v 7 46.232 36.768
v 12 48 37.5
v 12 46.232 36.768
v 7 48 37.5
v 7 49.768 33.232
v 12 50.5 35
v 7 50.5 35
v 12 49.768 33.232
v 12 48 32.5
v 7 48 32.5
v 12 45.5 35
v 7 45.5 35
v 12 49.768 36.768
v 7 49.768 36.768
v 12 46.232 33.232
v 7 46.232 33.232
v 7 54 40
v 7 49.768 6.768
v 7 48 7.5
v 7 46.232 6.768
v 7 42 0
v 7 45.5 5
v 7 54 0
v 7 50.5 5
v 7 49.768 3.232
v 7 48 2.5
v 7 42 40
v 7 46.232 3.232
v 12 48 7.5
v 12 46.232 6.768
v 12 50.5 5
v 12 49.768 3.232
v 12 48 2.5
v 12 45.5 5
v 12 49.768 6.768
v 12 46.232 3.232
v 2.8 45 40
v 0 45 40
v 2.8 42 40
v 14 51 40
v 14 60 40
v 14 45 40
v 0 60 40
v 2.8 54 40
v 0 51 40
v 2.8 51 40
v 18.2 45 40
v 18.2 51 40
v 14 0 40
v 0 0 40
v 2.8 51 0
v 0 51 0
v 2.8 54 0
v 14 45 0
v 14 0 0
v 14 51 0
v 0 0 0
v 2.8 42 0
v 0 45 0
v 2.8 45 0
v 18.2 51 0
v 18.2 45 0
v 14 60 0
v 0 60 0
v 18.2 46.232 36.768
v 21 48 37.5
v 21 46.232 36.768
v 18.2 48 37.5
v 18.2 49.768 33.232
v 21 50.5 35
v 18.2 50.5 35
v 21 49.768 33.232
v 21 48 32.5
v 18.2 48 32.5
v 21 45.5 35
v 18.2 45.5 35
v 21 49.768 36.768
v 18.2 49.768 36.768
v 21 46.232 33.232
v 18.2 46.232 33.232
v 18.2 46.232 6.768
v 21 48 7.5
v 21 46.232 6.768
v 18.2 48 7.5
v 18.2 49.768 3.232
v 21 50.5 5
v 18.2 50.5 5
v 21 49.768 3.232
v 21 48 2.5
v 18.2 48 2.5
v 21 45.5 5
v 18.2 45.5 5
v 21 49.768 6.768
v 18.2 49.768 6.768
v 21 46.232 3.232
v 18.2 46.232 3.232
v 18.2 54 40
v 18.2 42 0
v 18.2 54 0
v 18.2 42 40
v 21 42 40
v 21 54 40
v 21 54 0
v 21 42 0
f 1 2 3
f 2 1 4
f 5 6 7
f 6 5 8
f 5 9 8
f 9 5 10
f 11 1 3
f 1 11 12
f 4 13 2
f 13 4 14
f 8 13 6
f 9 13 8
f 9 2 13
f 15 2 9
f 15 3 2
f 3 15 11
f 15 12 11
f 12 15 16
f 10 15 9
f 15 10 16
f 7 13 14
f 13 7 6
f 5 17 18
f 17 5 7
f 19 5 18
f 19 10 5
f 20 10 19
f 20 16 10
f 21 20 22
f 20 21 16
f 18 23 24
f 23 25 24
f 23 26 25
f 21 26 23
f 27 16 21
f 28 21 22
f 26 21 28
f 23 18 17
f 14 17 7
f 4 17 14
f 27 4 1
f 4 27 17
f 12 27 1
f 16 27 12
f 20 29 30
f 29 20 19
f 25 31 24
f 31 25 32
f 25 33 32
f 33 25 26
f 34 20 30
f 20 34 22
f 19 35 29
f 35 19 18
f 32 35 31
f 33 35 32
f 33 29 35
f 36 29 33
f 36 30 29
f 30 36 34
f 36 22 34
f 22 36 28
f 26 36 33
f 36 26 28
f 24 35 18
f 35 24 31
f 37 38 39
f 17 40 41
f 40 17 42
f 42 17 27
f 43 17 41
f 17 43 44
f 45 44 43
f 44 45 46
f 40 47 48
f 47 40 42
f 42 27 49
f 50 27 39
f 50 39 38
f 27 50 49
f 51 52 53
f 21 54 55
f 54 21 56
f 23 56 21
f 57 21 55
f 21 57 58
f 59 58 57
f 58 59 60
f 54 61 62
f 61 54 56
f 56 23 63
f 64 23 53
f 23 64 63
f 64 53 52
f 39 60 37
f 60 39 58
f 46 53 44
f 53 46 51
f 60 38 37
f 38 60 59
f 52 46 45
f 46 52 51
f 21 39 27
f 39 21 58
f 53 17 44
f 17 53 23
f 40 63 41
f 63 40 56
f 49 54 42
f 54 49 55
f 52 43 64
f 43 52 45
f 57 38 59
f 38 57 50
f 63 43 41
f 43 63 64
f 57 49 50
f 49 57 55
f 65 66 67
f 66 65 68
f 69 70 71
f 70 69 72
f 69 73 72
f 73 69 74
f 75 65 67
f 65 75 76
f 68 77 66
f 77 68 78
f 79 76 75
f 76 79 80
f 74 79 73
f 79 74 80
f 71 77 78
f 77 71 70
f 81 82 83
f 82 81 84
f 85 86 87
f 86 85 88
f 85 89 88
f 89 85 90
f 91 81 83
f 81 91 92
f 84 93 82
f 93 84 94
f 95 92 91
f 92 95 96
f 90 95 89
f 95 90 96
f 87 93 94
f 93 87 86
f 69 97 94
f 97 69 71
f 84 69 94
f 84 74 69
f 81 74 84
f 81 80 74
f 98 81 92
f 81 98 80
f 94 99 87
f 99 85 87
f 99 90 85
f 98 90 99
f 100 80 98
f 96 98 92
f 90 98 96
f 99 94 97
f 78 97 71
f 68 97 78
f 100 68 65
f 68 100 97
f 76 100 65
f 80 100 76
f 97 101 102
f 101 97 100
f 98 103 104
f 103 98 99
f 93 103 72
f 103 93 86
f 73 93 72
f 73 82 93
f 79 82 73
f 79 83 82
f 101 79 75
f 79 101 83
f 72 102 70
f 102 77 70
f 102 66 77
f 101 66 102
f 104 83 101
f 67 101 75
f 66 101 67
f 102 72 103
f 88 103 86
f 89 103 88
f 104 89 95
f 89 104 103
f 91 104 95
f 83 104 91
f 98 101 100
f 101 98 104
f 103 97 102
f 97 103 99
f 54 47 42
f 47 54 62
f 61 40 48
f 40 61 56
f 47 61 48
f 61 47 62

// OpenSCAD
// file: keycontrol-mate.scad
module magnet(d, thickness = 2) {
   translate([0, thickness*-1, 0])
    rotate([0, 90, 90])
    color([0, 1, 0])
    cylinder(thickness,d=d);
}

module malematePlate(plateThickness, plateWidth, height) {
    
    magHeight1 = height - magnetDiameter;
    magHeight2 = magnetDiameter;
    
    difference() {
        cube([plateWidth, plateThickness, height]);
        color([0,0,1]) translate([-matingPlateWidth  + magnetThickness/2, matingPlateDepth/2, 0]) rotate ([0,0,90]) {
            translate([0, 0, magHeight1]) magnet(magnetDiameter, magnetThickness);
            translate([0, 0, magHeight2]) magnet(magnetDiameter, magnetThickness);
        }
    }
}


module malemateShaft(plateWidth, shaftLength, shaftWidth, height) {
    cube([shaftWidth, shaftLength, height]);
}

module malemate() {
    // Plate = front facing magnet holder
    // shaft = thing holding plate to structure
    shaftWid = matingShaftDepth;
    plateThick = matingPlateDepth;
    plateWid = matingPlateWidth;
    shaftLength = totalShaftLength - matingPlateWidth;

    rotate([0, 0, 270]) union() {
        translate( [-matingPlateDepth/2, totalShaftLength, 0] )rotate ([0, 0, -90]) malematePlate(plateThick, plateWid, moduleHeight);
        translate([-matingShaftDepth/2, 0, 0]) malemateShaft(plateWid, shaftLength, shaftWid, moduleHeight);
    }
}

module femalemateShaft(holeInset, holeWidth) {
    color([1, 1, 0]) translate([holeWidth, matingShaftDepth/2, 0]) cube([holeInset+1, matingShaftDepth, moduleHeight]);
}

module femalematePlate(holeWidth) {
    cube([holeWidth, matingPlateDepth, moduleHeight]);
}

module femaleHoles(plateThickness, plateWidth, height) {
    
    magHeight1 = height - magnetDiameter;
    magHeight2 = magnetDiameter;
    
    color([0,0,1]) translate([-magnetThickness, matingPlateDepth/2, 0]) rotate ([0,0,90]) {
        translate([0, 0,magHeight1]) magnet(magnetDiameter, magnetThickness);
        translate([0, 0,magHeight2]) magnet(magnetDiameter, magnetThickness);
    }
}

module femalemate() {
    height = moduleHeight;
    shaftWid = matingShaftDepth;
    magDiam = magnetDiameter;
    plateThick = matingPlateWidth;
    plateWid = matingPlateWidth;
    
    connectorLen = connectorLength;
    
    shaftLen = plateThick + connectorLen + shaftOffset;
    holeSize = plateThick + connectorLen;
    holeInsetThickness = matingPlateWidth;
    holeWidth = totalShaftLength - holeInsetThickness;
    
    rotate([0, 0, 180]) translate([0, -matingPlateDepth/2, 0]) union() {
        femalemateShaft(holeInsetThickness, holeWidth);
        femalematePlate(holeWidth);
        femaleHoles(plateThick, plateWid, height);
    }
}


connectorLength = 3;
magnetDiameter = 5;
magnetThickness = 5;
keyWidth = 14;
moduleDepth = 60;
moduleHeight = 40;

matingShaftDepth = moduleDepth * .1;
matingPlateDepth = matingShaftDepth * 2;
matingPlateWidth = keyWidth * 0.2;
totalShaftLength = keyWidth * 0.5;
shaftOffset = moduleDepth / 2;  // Distance from front face to centreline of shaft
// main file
connectorLength = 3;
magnetDiameter = 5;
magnetThickness = 5;
keyWidth = 14;
moduleDepth = 60;
moduleHeight = 40;

matingShaftDepth = moduleDepth * .1;
matingPlateDepth = matingShaftDepth * 2;
matingPlateWidth = keyWidth * 0.2;
totalShaftLength = keyWidth * 0.5;
shaftOffset = moduleDepth / 2;  // Distance from front face to centreline of shaft


include <keycontrol-mate.scad>;

module structure() {
    union() {
        difference() {
            cube([keyWidth, moduleDepth, moduleHeight]);
            translate([totalShaftLength, moduleDepth - matingPlateDepth ,0 ]) femalemate();
        }
        translate([keyWidth, moduleDepth - matingPlateDepth ,0 ]) malemate();
    }
}

module footprint() {
    translate([0, 18, -2]) cube([20,5,5]);
}

module pcbslot() {
    socketWidth = 10.56;
    socketHeight = 3.4;
    
    translate([1.5, 14, 4]) cube([10, 8, 16]);
    translate([-1.5, 15.5, 7])  {
        cube([socketHeight, 5, socketWidth]);
        translate([13, 0, 0]) cube([socketHeight, 5, socketWidth]);
    }
}

difference() {
    
    //pcbslot();
    //footprint();
}

union() {
    structure();
    //color([1,0,0]) translate([-keyWidth-1.0, 0,0])structure();
}

echo(version=version());
render(1);
